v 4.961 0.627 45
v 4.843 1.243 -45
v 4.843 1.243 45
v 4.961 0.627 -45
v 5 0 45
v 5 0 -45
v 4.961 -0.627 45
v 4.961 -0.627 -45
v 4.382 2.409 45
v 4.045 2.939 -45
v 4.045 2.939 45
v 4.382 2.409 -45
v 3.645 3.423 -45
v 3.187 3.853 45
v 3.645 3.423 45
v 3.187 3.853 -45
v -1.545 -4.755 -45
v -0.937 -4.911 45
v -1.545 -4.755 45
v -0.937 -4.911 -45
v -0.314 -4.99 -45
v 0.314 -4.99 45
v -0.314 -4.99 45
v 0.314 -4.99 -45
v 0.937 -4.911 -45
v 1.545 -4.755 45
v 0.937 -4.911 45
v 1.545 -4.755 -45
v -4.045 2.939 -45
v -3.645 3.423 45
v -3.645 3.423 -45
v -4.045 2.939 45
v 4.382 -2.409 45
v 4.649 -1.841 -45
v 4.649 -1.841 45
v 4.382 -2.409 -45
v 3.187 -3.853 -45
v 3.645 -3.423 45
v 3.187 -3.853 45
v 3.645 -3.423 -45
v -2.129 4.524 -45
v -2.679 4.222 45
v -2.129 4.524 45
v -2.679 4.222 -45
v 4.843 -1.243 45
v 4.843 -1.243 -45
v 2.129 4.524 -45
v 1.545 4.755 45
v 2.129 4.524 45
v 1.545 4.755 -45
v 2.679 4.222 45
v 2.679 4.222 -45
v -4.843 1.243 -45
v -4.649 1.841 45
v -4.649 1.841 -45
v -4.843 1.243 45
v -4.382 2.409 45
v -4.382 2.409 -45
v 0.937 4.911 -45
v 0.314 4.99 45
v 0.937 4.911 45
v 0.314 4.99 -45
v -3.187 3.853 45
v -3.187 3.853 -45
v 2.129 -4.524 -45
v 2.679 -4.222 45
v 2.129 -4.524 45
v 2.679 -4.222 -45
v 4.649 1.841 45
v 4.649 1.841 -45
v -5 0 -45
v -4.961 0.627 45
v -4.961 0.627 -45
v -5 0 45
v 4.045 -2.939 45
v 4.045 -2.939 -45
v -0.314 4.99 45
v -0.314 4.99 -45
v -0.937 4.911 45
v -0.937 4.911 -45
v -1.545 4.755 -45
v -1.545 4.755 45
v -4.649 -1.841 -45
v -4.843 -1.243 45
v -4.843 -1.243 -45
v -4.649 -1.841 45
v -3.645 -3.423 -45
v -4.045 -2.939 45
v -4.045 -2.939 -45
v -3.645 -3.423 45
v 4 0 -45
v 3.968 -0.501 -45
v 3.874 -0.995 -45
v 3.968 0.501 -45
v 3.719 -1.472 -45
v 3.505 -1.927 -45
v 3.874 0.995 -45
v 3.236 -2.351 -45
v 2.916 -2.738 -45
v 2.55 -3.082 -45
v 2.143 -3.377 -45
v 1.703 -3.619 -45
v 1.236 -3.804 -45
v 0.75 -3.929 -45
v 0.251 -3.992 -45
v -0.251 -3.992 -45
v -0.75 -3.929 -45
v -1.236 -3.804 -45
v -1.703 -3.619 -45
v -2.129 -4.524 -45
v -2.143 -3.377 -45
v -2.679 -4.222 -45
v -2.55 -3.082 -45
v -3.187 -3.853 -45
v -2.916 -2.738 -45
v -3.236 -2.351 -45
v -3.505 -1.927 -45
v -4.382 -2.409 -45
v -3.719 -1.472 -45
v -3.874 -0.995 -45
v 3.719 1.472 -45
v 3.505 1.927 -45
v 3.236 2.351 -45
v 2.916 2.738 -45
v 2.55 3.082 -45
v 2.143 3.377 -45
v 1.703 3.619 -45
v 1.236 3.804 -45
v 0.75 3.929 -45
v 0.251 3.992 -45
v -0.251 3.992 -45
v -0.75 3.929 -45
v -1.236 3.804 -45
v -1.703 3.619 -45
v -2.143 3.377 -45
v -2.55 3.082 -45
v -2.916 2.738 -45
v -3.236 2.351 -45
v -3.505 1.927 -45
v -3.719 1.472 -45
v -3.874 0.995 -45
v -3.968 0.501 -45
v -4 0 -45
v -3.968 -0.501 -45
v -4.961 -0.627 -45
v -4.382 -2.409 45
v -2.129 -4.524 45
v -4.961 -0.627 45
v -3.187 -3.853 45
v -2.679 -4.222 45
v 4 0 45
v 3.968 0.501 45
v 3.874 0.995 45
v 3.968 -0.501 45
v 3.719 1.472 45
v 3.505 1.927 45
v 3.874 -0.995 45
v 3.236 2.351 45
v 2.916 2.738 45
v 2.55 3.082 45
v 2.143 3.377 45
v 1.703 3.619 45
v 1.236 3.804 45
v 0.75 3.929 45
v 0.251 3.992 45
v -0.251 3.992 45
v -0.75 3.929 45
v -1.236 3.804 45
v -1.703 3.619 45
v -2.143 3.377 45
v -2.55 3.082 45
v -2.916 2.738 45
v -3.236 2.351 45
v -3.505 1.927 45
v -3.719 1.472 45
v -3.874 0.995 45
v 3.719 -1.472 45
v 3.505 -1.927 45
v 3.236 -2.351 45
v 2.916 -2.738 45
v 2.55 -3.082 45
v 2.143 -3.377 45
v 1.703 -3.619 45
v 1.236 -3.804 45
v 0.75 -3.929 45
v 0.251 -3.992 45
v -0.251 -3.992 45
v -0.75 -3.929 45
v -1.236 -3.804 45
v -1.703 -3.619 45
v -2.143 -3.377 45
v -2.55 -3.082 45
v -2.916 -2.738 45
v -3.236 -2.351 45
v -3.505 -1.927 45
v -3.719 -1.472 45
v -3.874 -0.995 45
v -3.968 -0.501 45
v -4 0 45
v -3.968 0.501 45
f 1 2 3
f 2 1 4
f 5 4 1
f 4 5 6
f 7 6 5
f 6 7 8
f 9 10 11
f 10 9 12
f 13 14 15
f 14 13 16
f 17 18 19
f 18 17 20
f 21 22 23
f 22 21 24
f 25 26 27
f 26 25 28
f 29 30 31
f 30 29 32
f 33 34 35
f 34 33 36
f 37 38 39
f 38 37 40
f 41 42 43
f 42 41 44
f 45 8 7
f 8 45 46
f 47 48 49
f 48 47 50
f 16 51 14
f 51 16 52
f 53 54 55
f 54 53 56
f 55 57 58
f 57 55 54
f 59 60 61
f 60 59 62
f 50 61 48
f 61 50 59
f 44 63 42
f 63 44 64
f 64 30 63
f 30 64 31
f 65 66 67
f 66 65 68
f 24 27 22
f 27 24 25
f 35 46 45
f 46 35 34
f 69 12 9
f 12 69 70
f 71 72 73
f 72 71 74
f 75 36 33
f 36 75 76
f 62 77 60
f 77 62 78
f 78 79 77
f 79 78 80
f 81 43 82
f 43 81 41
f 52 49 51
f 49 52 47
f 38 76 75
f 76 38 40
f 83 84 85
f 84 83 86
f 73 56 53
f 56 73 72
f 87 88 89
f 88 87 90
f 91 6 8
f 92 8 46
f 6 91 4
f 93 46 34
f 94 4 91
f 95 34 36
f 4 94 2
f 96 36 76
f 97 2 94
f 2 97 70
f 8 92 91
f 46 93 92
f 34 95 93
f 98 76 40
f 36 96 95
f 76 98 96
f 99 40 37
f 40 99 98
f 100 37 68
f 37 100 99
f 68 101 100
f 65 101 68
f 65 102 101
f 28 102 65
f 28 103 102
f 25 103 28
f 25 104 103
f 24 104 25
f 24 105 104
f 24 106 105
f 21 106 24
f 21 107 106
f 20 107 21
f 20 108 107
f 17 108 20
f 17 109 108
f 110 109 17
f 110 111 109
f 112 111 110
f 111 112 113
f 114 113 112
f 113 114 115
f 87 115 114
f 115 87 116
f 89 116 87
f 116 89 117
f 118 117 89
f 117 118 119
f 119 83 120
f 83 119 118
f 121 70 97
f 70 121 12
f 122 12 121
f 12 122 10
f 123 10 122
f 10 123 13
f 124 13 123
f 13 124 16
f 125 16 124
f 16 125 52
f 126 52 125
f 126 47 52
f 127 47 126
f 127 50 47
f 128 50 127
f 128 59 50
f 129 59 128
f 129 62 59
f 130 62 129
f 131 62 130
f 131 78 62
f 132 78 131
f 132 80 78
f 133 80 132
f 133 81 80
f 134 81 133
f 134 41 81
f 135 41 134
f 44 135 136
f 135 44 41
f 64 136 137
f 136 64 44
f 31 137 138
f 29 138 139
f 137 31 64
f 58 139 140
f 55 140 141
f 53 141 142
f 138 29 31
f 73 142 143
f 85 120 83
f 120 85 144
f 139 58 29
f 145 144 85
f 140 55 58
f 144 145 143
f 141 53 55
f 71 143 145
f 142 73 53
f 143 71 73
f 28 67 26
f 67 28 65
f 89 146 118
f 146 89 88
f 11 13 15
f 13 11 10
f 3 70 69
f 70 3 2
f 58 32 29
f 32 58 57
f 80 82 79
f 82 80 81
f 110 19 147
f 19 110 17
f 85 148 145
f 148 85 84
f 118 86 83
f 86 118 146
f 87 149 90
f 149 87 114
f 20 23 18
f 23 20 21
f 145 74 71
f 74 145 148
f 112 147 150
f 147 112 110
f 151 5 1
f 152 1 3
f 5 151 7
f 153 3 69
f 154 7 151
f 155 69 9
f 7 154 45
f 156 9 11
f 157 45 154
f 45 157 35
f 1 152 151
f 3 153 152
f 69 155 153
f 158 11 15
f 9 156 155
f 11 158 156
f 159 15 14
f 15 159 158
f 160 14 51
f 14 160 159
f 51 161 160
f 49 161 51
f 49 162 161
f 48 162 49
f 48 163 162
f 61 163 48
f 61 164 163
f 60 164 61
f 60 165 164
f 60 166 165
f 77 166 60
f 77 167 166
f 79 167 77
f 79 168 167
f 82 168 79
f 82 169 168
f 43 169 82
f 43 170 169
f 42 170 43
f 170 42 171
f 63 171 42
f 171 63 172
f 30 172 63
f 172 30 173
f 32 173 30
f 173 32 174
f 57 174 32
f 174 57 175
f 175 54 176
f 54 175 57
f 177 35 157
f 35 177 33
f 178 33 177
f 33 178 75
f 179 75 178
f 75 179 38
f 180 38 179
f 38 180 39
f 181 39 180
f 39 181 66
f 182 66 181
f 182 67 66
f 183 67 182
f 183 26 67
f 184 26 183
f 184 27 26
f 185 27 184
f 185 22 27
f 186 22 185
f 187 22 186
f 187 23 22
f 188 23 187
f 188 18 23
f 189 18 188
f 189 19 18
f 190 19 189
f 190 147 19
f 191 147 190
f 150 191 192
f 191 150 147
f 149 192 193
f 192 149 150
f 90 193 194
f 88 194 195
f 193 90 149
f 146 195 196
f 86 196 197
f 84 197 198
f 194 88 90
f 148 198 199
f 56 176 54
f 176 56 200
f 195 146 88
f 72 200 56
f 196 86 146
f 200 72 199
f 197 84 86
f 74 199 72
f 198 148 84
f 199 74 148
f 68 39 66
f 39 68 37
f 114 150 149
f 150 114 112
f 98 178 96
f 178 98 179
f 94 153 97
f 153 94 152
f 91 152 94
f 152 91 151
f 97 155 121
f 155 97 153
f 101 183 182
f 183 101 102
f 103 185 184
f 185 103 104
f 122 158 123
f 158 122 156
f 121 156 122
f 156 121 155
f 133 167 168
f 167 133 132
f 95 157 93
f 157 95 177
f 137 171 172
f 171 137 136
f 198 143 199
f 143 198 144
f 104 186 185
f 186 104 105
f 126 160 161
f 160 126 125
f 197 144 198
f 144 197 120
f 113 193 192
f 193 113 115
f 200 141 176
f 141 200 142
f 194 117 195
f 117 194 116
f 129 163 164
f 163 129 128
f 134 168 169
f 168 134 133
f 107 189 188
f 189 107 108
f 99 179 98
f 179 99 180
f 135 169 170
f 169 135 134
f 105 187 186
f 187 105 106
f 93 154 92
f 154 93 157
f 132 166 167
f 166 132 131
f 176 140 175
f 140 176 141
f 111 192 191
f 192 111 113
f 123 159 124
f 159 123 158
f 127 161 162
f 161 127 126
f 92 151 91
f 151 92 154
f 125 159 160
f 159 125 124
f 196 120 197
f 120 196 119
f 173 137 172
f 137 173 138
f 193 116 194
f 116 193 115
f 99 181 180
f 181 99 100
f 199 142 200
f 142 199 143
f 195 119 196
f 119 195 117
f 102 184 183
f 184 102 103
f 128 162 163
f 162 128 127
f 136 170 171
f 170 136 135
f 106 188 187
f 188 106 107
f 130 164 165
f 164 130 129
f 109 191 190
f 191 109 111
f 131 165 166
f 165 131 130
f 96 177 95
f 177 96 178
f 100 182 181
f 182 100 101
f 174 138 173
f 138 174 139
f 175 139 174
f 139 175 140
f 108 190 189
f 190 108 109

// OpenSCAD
$fn = 50;


difference() {
	union() {
		translate(v = [0, 0, -45.0000000000]) {
			cylinder(h = 90, r = 5.0000000000);
		}
	}
	union() {
		translate(v = [0, 0, -100.0000000000]) {
			cylinder(h = 200, r = 4.0000000000);
		}
	}
}
